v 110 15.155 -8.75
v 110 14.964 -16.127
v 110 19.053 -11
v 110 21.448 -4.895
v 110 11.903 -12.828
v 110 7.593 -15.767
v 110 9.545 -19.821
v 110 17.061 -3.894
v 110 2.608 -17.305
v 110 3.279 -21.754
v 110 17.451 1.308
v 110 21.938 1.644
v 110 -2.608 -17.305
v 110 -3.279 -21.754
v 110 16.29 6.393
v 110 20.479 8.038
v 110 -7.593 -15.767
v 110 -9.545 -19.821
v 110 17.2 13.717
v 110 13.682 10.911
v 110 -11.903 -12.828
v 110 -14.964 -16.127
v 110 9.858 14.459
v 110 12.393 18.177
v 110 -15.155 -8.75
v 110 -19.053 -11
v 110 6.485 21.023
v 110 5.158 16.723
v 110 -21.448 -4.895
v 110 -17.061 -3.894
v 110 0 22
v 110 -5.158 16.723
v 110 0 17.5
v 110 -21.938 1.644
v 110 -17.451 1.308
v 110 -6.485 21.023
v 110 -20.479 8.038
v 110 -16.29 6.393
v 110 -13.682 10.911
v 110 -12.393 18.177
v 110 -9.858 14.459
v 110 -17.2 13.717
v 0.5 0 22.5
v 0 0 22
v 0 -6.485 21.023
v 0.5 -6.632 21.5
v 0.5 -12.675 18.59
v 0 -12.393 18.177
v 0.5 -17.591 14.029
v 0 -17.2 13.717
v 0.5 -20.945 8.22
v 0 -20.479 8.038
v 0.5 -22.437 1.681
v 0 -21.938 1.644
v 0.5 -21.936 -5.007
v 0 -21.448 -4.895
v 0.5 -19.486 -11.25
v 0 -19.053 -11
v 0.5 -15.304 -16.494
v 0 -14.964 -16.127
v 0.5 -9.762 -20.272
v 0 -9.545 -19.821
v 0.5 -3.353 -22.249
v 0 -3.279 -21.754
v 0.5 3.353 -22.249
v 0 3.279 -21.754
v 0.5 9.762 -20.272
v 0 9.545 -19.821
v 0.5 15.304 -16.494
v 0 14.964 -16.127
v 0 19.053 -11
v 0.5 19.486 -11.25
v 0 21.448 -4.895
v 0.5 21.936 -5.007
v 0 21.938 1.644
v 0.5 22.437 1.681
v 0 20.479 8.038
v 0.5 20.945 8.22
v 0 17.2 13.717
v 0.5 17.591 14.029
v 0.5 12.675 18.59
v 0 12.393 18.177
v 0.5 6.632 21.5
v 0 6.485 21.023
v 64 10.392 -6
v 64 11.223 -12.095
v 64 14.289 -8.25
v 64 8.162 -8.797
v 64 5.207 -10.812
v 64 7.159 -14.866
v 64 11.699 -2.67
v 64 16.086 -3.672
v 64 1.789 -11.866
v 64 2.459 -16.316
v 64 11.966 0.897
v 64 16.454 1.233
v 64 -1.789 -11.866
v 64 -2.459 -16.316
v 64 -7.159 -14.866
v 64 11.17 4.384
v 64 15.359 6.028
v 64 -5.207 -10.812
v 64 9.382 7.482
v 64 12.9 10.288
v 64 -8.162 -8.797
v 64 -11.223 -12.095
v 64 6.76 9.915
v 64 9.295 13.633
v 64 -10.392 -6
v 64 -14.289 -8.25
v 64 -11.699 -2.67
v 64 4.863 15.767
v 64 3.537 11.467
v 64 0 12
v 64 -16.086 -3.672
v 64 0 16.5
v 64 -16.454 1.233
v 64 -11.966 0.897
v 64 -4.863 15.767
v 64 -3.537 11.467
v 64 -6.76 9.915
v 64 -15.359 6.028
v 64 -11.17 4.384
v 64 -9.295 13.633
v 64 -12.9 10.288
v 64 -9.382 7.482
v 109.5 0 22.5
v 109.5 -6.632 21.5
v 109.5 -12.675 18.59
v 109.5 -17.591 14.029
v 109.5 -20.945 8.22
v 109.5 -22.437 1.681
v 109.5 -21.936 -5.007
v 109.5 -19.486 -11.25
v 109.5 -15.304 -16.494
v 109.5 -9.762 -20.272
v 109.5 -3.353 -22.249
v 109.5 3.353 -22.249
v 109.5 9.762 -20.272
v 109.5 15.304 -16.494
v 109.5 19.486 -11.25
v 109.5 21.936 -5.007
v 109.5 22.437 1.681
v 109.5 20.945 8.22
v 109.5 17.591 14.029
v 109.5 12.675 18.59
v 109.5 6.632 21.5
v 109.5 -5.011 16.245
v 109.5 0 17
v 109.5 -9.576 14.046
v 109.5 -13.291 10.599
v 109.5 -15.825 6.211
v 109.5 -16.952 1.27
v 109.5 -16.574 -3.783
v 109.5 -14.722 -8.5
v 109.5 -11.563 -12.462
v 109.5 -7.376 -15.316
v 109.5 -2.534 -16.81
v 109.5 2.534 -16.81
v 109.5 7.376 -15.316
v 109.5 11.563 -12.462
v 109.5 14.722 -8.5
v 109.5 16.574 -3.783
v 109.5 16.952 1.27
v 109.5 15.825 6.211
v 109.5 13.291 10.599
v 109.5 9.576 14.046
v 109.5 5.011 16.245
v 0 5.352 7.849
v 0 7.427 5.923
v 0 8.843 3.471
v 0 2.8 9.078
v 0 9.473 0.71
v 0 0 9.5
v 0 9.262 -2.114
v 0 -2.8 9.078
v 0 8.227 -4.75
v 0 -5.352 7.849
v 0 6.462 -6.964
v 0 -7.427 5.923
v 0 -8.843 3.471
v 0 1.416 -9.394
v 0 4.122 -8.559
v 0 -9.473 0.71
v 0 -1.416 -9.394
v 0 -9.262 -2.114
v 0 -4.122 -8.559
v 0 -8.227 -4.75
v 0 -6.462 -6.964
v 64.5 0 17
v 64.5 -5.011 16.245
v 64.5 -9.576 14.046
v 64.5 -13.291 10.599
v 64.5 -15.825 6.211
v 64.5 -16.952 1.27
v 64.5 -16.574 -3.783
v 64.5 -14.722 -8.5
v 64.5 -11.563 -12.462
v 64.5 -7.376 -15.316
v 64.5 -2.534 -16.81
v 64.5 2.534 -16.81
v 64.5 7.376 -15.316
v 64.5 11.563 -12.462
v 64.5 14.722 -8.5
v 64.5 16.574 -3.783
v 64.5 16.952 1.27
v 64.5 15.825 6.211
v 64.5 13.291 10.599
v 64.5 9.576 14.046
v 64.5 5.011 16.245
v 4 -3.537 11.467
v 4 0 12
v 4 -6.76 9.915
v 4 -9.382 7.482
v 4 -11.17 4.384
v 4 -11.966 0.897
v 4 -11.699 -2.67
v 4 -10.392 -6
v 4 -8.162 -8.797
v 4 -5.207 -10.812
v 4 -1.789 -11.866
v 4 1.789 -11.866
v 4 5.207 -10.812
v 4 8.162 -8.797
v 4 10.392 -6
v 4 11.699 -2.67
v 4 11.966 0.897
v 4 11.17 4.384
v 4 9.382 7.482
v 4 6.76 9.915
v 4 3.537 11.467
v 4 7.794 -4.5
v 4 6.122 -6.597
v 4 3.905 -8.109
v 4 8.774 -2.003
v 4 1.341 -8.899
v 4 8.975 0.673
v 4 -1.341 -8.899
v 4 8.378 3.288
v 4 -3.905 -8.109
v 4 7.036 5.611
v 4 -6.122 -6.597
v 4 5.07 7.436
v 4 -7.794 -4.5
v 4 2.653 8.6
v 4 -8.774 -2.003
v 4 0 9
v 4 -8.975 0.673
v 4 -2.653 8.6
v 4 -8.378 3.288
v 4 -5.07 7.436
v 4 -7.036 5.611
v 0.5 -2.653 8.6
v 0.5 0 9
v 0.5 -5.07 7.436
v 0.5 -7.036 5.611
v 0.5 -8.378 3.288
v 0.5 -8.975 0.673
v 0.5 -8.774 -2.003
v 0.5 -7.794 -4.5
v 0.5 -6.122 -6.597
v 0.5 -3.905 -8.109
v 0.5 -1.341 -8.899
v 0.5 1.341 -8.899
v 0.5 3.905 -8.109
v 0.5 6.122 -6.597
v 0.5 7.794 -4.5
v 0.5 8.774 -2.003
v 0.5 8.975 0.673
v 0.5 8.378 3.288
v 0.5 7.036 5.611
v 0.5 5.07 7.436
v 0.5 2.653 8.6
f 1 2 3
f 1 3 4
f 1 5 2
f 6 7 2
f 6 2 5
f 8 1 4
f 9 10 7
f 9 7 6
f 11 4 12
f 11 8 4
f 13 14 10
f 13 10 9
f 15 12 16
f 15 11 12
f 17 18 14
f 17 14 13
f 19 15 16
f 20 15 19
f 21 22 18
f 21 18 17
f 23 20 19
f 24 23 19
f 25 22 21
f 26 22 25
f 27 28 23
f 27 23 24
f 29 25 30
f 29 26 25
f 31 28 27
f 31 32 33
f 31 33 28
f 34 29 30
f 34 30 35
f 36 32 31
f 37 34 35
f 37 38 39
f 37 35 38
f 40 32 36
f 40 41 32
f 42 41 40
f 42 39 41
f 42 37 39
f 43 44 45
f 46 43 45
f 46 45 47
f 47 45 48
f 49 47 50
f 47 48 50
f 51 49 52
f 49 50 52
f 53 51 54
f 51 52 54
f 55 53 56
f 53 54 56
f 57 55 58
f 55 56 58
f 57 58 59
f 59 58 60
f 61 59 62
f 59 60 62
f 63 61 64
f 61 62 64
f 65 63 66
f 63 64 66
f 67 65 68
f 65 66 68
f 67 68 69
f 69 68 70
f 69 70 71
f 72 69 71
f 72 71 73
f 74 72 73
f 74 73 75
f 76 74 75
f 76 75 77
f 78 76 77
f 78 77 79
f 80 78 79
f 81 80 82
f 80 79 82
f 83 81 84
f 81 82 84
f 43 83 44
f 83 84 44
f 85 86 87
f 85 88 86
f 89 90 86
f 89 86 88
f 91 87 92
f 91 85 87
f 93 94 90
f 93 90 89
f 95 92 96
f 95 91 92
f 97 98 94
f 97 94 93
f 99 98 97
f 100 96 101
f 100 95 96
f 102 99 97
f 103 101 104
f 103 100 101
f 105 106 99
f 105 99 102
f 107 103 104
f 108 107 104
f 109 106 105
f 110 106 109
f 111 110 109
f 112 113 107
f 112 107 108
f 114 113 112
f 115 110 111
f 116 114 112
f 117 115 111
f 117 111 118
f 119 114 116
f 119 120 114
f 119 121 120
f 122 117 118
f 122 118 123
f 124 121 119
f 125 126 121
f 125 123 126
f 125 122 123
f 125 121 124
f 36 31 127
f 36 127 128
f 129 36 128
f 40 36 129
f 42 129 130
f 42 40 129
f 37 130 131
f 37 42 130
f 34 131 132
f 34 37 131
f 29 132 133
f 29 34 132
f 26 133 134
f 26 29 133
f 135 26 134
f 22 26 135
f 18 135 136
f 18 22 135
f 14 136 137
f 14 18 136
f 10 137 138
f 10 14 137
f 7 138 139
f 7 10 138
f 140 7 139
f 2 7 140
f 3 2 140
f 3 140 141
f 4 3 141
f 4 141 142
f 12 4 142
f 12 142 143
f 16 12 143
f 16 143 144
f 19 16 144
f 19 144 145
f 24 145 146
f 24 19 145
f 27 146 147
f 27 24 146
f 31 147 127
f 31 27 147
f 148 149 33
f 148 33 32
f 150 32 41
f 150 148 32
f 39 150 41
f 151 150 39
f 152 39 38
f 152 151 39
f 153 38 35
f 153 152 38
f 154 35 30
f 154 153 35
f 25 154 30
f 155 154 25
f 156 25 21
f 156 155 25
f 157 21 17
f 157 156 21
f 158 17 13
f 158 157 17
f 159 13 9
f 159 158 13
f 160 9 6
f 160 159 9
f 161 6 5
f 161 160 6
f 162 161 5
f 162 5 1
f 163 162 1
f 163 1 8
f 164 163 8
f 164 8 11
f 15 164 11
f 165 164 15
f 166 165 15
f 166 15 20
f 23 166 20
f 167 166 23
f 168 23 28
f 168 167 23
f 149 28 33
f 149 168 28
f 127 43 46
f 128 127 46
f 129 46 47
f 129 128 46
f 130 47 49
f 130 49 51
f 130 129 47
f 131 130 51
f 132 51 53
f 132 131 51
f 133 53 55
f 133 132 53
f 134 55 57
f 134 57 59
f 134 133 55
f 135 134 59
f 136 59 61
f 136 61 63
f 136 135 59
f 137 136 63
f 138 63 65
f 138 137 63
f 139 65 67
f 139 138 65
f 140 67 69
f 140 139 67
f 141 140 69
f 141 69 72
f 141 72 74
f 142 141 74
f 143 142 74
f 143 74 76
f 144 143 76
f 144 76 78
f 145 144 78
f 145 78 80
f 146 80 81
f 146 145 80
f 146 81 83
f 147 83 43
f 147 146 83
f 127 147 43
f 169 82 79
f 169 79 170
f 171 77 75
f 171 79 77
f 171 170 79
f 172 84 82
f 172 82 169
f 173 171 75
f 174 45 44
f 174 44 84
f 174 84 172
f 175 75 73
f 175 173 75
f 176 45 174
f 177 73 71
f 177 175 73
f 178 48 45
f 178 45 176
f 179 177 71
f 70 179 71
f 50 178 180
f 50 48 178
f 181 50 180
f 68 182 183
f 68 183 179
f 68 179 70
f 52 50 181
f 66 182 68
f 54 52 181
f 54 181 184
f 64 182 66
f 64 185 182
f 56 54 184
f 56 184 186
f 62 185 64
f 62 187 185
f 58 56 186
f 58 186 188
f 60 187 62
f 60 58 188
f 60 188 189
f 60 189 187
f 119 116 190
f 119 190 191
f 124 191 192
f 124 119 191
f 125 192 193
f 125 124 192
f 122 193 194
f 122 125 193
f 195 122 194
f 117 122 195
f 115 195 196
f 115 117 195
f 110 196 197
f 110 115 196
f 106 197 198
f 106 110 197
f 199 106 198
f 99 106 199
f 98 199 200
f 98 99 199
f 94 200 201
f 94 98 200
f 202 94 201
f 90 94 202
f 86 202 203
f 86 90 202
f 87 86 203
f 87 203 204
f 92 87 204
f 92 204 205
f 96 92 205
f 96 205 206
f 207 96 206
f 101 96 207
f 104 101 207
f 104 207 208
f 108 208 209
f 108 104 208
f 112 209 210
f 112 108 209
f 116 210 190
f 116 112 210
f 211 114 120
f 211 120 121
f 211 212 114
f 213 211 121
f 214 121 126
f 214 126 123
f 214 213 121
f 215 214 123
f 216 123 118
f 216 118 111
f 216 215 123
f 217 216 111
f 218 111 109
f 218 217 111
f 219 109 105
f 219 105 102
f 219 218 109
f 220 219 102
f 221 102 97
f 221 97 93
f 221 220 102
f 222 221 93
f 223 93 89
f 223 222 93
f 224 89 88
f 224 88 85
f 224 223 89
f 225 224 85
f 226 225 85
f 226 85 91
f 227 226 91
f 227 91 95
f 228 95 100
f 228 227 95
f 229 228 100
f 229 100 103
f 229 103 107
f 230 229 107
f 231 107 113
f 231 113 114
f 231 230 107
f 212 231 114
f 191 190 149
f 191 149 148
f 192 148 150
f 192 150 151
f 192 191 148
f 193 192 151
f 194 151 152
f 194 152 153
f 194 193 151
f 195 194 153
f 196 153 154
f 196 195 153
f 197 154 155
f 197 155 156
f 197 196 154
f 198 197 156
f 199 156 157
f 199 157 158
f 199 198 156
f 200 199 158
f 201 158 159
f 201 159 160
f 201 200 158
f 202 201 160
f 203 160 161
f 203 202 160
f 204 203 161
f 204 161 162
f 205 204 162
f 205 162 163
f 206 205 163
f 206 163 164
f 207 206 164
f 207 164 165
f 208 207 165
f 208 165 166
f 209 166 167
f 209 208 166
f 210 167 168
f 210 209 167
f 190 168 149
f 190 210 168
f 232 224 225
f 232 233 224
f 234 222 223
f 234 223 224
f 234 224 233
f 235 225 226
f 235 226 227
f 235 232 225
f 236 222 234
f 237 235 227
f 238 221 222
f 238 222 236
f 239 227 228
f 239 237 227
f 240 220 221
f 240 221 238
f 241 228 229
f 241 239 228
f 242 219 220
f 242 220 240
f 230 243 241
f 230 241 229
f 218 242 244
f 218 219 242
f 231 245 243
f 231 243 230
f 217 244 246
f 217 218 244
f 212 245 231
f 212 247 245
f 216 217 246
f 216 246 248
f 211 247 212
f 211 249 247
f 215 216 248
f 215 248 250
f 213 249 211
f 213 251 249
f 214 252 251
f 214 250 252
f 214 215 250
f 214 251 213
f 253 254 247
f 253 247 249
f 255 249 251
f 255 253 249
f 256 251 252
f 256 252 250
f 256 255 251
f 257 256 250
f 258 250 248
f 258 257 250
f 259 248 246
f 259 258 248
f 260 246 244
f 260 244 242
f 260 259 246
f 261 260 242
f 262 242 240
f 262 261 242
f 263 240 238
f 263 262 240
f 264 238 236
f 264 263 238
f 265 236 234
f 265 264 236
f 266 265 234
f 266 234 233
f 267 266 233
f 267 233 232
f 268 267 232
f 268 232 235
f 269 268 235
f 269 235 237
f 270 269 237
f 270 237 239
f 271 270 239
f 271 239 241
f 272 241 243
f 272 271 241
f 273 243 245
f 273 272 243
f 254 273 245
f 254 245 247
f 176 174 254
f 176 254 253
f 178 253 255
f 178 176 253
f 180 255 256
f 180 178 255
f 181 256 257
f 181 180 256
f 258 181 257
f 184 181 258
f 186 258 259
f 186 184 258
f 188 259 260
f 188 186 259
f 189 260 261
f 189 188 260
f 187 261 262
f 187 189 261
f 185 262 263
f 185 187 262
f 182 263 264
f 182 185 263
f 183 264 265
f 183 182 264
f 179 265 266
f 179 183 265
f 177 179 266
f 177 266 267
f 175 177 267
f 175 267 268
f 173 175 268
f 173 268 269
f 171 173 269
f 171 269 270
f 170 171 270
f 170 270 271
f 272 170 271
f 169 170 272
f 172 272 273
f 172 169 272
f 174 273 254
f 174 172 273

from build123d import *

# Parameters (mm, degrees)
CHAMFER1_SIZE = 0.5


with BuildPart() as part:
    # Sketch1 → Revolve1 (revolve)
    with BuildSketch(Plane.XY, mode=Mode.PRIVATE) as revolve1_sk:
        Polygon((0, 22.5), (110, 22.5), (110, 17), (64, 17), (64, 12), (4, 12), (4, 9), (0, 9), align=None)
    revolve(revolve1_sk.sketch.rotate(Axis((0, 0, 0), (1, 0, 0)), 90), axis=Axis((0, 0, 0), (1, 0, 0)))

    # Chamfer1
    chamfer1_edges = [part.edges().sort_by_distance(p)[0] for p in [
        (0, 0, -22.5),
        (0, 0, -9),
        (64, 0, -17),
        (110, 0, -17),
        (110, 0, -22.5),
    ]]
    chamfer(chamfer1_edges, length=CHAMFER1_SIZE)


solid = part.part
